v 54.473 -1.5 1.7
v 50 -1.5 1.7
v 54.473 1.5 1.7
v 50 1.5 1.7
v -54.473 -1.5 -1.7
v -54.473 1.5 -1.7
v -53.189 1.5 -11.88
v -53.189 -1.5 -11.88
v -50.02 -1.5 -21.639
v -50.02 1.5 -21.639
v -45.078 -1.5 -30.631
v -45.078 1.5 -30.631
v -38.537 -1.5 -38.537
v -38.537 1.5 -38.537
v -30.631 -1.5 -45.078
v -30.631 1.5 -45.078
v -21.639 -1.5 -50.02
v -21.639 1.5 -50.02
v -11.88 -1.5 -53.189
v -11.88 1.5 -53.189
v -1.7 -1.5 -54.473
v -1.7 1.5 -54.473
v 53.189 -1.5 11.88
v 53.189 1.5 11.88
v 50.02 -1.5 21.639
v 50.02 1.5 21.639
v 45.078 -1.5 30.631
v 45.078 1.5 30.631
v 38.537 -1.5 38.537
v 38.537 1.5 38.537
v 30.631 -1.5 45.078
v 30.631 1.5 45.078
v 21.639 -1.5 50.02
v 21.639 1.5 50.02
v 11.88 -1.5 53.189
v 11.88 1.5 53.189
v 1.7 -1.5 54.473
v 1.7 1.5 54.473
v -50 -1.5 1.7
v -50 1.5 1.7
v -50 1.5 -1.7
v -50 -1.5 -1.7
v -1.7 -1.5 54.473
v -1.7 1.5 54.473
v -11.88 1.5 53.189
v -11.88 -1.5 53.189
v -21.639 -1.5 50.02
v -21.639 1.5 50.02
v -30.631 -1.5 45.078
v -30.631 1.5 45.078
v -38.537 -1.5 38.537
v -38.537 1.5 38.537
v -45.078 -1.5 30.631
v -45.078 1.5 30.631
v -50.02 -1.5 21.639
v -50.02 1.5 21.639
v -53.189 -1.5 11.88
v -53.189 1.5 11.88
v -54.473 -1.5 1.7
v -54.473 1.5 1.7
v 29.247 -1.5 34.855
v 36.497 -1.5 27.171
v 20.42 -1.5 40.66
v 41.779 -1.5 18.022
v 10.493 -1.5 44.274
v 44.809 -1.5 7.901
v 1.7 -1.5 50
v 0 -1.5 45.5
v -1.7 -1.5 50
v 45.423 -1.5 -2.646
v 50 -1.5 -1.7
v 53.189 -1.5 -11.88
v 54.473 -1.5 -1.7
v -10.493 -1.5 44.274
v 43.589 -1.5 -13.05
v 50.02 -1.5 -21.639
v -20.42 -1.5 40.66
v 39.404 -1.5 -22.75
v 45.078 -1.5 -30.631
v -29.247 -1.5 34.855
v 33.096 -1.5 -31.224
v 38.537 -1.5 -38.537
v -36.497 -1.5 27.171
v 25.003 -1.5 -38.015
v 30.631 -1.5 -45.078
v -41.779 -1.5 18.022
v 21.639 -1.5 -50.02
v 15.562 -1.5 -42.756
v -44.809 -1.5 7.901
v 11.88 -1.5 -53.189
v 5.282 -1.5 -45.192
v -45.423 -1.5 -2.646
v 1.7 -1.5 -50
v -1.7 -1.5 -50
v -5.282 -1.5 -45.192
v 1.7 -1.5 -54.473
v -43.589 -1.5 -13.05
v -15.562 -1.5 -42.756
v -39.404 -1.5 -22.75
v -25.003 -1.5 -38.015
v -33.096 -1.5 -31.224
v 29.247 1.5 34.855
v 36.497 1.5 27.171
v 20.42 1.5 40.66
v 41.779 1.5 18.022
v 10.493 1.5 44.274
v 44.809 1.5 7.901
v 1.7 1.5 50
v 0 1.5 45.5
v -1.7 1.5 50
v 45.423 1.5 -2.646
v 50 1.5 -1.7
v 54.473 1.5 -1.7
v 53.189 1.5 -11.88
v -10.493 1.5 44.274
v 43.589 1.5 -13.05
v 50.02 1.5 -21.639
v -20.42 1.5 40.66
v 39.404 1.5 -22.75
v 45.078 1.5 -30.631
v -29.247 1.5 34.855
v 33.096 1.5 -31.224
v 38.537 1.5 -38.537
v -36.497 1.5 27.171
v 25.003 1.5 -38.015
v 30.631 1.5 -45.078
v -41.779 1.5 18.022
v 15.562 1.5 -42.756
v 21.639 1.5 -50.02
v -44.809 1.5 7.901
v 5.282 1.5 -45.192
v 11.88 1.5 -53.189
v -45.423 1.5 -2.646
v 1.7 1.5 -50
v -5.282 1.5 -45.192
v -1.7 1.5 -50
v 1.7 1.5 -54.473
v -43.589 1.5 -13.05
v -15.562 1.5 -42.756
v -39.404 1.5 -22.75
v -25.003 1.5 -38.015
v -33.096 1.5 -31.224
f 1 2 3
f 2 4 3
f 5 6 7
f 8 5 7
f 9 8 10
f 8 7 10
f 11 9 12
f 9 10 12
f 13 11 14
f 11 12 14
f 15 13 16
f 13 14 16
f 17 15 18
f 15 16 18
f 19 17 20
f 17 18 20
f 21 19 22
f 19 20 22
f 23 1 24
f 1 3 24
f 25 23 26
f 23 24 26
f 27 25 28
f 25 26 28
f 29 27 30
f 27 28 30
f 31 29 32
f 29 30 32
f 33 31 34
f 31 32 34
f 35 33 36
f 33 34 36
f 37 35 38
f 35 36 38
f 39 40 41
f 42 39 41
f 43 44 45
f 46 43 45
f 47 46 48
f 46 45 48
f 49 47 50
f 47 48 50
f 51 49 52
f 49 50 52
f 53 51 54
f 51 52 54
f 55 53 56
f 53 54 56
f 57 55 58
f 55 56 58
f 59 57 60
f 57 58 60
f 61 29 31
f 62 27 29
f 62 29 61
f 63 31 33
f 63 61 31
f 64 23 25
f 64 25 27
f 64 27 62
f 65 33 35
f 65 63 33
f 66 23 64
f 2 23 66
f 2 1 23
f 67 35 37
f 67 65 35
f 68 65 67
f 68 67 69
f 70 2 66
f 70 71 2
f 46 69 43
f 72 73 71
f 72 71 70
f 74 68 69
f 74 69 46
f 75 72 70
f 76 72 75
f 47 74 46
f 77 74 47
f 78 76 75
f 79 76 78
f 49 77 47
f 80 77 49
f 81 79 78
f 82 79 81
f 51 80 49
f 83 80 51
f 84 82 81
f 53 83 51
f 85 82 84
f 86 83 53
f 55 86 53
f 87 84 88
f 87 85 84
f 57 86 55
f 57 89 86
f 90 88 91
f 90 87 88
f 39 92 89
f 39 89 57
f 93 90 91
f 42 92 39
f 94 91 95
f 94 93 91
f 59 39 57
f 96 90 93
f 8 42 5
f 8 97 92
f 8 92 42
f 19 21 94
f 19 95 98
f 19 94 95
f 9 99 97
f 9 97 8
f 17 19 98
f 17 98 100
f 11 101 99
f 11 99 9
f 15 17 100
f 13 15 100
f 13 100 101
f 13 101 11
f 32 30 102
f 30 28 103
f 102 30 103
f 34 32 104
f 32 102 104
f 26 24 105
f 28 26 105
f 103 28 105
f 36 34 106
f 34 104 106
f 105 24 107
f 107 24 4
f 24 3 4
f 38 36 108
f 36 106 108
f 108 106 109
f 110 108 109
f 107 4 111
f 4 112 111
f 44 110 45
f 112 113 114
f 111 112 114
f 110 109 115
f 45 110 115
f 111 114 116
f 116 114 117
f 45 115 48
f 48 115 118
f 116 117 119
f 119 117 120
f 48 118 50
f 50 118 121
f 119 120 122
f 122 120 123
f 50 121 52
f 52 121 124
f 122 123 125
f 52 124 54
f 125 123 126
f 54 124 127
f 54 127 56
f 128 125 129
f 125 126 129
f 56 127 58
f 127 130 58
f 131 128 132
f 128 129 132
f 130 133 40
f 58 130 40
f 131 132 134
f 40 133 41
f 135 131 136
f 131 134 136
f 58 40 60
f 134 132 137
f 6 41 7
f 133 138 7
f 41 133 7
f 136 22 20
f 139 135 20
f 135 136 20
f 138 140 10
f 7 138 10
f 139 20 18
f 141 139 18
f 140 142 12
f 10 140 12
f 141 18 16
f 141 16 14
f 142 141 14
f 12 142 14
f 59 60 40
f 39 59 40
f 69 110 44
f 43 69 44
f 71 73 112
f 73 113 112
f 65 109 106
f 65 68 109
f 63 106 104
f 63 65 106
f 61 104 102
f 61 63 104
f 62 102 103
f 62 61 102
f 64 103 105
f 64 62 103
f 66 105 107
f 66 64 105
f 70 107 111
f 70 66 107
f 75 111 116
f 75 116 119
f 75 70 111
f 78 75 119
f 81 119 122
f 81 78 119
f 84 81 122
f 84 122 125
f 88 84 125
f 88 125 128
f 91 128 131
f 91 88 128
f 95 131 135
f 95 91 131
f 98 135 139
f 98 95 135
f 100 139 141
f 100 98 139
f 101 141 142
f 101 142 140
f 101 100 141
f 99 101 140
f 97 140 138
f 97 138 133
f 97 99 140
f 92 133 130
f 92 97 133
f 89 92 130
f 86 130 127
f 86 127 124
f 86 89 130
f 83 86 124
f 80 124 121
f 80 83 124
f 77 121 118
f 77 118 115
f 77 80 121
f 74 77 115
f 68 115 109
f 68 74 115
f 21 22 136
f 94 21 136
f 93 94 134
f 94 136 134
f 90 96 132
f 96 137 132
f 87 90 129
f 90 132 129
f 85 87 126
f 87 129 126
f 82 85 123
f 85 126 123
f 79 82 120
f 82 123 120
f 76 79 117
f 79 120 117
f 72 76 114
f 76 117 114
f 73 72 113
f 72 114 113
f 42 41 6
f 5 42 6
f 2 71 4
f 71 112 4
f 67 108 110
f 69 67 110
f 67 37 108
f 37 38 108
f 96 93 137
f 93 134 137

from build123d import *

# Parameters (mm, degrees)
SKETCH1_R           = 45.5
BOSS_EXTRUDE1_DEPTH = 1.5


with BuildPart() as part:
    # Sketch1 → Boss-Extrude1 (new, symmetric)
    with BuildSketch(Plane(origin=(0, 0, 0), x_dir=(1, 0, 0), z_dir=(0, 1, 0))):
        with BuildLine():
            Line((-1.7, 54.473479786), (-1.7, 50))
            Line((-1.7, 50), (1.7, 50))
            Line((1.7, 50), (1.7, 54.473479786))
            ThreePointArc((1.7, 54.473479786), (38.537319575, 38.537319575), (54.473479786, 1.7))
            Line((54.473479786, 1.7), (50, 1.7))
            Line((50, 1.7), (50, -1.7))
            Line((50, -1.7), (54.473479786, -1.7))
            ThreePointArc((54.473479786, -1.7), (38.537319575, -38.537319575), (1.7, -54.473479786))
            Line((1.7, -54.473479786), (1.7, -50))
            Line((1.7, -50), (-1.7, -50))
            Line((-1.7, -50), (-1.7, -54.473479786))
            ThreePointArc((-1.7, -54.473479786), (-38.537319575, -38.537319575), (-54.473479786, -1.7))
            Line((-54.473479786, -1.7), (-50, -1.7))
            Line((-50, -1.7), (-50, 1.7))
            Line((-50, 1.7), (-54.473479786, 1.7))
            ThreePointArc((-54.473479786, 1.7), (-38.537319575, 38.537319575), (-1.7, 54.473479786))
        make_face()
        with Locations(Location((0, 0, 0), (0, 0, 270))):
            Circle(SKETCH1_R, mode=Mode.SUBTRACT)
    extrude(amount=BOSS_EXTRUDE1_DEPTH, both=True)


solid = part.part
